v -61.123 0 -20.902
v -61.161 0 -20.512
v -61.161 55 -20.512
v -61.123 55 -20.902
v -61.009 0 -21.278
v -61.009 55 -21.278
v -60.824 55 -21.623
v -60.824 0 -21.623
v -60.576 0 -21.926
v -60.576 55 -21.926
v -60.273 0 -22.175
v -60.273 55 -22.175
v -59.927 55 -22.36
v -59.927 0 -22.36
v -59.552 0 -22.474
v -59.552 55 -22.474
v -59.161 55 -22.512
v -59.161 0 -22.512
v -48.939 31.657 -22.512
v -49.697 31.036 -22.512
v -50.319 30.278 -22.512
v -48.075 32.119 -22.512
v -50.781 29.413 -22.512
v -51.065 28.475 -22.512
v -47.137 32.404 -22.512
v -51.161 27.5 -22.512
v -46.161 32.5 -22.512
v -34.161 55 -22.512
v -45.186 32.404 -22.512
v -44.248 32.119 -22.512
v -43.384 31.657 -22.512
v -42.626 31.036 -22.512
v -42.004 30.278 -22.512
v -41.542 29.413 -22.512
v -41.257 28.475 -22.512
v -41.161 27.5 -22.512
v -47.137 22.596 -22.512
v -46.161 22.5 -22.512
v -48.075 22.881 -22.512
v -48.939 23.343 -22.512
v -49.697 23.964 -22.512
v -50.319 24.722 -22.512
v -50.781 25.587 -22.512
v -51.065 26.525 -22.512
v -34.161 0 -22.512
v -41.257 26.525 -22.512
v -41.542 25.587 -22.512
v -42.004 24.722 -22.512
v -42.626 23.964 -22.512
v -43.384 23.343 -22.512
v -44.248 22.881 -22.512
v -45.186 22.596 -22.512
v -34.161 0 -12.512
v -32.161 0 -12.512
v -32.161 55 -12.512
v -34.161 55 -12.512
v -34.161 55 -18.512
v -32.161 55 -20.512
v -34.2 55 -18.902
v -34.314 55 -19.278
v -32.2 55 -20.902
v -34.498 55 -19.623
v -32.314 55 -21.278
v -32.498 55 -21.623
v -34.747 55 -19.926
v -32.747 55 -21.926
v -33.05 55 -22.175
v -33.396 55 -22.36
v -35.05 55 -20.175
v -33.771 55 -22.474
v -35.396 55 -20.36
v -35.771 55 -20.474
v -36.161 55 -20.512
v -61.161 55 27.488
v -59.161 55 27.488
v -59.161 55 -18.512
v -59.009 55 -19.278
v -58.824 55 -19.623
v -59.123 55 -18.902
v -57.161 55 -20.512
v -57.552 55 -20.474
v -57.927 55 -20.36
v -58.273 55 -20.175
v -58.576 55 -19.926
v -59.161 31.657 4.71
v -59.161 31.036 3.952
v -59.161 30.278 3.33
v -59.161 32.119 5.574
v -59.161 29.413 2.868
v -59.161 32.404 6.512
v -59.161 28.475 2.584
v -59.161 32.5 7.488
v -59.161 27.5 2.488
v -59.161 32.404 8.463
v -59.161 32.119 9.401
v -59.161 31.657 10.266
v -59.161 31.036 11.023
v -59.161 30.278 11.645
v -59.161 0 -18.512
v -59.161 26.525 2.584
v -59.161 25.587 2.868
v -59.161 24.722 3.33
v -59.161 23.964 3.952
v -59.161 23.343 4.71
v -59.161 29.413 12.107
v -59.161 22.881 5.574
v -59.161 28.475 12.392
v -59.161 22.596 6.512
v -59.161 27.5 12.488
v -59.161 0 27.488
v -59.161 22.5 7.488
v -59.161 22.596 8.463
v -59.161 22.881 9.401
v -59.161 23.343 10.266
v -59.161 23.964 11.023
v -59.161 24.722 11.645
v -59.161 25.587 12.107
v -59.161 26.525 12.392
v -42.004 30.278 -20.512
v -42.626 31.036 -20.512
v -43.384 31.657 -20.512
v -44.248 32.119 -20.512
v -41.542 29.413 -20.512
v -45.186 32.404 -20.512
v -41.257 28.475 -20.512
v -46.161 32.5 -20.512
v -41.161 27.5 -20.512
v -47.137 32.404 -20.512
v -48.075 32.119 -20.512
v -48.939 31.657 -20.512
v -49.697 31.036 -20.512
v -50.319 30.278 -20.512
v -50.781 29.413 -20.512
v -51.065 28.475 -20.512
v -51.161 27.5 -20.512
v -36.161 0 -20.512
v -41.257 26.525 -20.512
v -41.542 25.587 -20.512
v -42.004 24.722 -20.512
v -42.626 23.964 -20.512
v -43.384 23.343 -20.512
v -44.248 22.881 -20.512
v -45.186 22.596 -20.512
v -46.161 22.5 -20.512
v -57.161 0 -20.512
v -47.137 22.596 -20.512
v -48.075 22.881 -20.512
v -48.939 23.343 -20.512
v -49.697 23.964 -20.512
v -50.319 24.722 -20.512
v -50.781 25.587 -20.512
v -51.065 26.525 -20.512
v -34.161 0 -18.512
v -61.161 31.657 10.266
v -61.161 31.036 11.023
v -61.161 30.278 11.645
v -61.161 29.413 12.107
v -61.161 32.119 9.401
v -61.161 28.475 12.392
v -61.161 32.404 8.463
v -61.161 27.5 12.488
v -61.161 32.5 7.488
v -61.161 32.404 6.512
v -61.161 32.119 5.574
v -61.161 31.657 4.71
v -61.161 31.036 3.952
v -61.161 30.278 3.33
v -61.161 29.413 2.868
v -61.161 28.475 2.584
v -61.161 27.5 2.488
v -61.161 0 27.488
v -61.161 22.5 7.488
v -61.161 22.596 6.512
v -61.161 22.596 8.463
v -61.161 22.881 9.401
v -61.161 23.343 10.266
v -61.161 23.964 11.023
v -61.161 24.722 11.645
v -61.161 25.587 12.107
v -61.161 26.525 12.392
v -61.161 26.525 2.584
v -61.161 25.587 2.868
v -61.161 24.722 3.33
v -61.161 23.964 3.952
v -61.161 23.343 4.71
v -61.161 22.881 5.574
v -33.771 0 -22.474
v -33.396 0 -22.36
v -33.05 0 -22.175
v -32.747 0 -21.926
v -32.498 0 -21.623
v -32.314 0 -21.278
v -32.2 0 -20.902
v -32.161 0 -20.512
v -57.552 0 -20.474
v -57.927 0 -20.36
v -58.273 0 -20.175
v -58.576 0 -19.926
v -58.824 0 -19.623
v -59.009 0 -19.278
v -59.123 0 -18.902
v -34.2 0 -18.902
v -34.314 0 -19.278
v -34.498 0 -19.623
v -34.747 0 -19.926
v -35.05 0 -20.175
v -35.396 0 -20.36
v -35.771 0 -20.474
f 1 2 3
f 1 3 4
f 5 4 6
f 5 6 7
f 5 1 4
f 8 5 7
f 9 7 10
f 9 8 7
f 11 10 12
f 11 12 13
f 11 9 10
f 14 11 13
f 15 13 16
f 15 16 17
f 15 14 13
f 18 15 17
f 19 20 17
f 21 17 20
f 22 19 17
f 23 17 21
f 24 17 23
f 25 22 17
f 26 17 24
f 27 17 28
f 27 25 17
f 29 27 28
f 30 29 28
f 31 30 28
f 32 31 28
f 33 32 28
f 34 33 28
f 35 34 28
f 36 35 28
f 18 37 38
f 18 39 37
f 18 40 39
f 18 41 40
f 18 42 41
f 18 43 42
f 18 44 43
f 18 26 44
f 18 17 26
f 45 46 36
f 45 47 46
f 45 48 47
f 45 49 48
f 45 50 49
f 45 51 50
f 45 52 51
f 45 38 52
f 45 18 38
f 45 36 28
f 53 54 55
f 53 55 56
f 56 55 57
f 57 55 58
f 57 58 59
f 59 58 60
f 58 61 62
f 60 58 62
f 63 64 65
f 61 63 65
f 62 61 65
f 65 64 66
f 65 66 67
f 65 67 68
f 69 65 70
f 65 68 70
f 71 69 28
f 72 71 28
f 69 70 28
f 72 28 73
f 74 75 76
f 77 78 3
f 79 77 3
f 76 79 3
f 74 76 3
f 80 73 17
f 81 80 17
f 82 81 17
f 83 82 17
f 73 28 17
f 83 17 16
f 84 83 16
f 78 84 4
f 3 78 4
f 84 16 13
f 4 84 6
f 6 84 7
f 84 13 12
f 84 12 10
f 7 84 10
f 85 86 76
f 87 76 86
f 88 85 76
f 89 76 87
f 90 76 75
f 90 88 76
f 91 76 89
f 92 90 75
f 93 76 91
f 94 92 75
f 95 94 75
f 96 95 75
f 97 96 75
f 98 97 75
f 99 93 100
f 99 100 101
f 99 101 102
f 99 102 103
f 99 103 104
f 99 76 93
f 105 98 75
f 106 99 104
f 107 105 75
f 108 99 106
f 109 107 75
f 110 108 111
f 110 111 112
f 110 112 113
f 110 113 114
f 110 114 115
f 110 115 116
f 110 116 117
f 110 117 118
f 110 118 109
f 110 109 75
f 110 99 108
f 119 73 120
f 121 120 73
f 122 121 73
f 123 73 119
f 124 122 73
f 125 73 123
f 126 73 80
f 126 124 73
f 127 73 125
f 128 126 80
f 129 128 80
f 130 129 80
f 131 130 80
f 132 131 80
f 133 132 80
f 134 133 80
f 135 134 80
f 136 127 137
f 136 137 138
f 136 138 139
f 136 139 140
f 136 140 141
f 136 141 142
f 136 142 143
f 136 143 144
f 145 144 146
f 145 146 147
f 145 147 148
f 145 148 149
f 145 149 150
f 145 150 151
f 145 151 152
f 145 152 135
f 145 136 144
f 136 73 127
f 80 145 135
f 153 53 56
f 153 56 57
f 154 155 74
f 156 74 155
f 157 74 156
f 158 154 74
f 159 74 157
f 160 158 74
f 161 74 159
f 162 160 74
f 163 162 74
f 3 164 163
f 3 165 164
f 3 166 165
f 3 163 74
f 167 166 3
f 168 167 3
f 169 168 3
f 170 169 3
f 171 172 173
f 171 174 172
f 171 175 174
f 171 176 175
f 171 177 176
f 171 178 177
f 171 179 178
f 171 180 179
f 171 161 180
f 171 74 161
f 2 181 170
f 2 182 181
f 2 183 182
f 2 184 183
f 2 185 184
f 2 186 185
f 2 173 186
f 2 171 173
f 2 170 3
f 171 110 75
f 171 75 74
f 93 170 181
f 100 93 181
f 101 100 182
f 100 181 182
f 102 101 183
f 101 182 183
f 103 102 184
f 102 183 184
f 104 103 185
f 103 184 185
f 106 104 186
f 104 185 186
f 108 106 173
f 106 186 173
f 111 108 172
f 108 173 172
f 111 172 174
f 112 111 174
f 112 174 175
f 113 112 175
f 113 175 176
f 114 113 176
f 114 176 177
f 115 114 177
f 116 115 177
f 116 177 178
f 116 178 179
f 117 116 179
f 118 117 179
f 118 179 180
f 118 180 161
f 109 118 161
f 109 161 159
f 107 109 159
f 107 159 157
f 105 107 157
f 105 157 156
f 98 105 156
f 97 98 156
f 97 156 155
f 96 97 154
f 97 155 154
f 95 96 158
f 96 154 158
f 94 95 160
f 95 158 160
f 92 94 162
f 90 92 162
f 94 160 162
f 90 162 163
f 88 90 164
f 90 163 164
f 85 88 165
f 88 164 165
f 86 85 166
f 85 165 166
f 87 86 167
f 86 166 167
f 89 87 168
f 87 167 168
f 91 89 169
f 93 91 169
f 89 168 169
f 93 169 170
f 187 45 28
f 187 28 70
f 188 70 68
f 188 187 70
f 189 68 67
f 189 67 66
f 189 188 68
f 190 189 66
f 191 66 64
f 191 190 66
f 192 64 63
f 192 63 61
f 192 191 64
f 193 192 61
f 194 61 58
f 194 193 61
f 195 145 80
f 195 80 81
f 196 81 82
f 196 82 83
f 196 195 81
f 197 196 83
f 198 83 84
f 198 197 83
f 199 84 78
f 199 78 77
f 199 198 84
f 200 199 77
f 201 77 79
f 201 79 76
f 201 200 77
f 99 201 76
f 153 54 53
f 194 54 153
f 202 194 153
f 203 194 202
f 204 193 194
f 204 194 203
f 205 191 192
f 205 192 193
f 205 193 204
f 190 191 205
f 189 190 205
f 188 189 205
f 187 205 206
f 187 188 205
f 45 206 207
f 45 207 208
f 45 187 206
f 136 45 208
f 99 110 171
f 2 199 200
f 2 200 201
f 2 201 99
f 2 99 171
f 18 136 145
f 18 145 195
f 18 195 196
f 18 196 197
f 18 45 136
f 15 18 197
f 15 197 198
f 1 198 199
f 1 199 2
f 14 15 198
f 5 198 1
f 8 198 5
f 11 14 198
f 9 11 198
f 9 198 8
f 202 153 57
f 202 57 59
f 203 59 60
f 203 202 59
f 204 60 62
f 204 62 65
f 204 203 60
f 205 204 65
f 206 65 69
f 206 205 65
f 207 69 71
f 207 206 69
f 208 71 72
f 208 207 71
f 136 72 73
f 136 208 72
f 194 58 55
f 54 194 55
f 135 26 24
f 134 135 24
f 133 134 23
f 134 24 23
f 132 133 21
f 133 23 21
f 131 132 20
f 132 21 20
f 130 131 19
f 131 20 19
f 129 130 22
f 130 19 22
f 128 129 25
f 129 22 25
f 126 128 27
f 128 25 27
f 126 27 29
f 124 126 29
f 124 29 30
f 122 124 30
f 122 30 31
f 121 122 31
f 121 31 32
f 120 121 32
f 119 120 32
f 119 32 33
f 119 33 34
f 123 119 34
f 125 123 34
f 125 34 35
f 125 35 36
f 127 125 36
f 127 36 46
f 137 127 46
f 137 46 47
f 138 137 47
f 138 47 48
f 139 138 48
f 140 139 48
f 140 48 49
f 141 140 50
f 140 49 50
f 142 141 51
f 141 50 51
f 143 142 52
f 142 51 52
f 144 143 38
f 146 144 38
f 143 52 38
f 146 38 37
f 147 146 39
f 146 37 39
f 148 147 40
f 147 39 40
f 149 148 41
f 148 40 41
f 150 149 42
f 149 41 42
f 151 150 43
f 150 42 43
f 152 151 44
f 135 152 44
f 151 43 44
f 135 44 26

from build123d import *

# Parameters (mm, degrees)
BOSS_EXTRUDE1_DEPTH              = 55
M10X1_0_TAPPED_HOLE2_D           = 9
M10X1_0_TAPPED_HOLE2_DEPTH       = 23
M10X1_0_TAPPED_HOLE2_CBORE_D     = 10
M10X1_0_TAPPED_HOLE2_CBORE_DEPTH = 20
M10X1_0_TAPPED_HOLE2_TIP         = 2.703872786
M10X1_0_TAPPED_HOLE1_D           = 9
M10X1_0_TAPPED_HOLE1_DEPTH       = 23
M10X1_0_TAPPED_HOLE1_CBORE_D     = 10
M10X1_0_TAPPED_HOLE1_CBORE_DEPTH = 20
M10X1_0_TAPPED_HOLE1_TIP         = 2.703872786


with BuildPart() as part:
    # Sketch1 → Boss-Extrude1 (new body)
    with BuildSketch(Plane(origin=(0, 0, 0), x_dir=(1, 0, 0), z_dir=(0, 1, 0))):
        with BuildLine():
            Line((-61.161397451, -27.487824391), (-61.161397451, 20.512175609))
            ThreePointArc((-61.161397451, 20.512175609), (-60.575611013, 21.926389171), (-59.161397451, 22.512175609))
            Line((-59.161397451, 22.512175609), (-34.161397451, 22.512175609))
            ThreePointArc((-34.161397451, 22.512175609), (-32.747183888, 21.926389171), (-32.161397451, 20.512175609))
            Line((-32.161397451, 20.512175609), (-32.161397451, 12.512175609))
            Line((-32.161397451, 12.512175609), (-34.161397451, 12.512175609))
            Line((-34.161397451, 12.512175609), (-34.161397451, 18.512175609))
            ThreePointArc((-34.161397451, 18.512175609), (-34.747183888, 19.926389171), (-36.161397451, 20.512175609))
            Line((-36.161397451, 20.512175609), (-57.161397451, 20.512175609))
            ThreePointArc((-57.161397451, 20.512175609), (-58.575611013, 19.926389171), (-59.161397451, 18.512175609))
            Line((-59.161397451, 18.512175609), (-59.161397451, -27.487824391))
            Line((-59.161397451, -27.487824391), (-61.161397451, -27.487824391))
        make_face()
    extrude(amount=BOSS_EXTRUDE1_DEPTH)

    # M10x1.0 Tapped Hole2
    with Locations(Plane(origin=(-46.161397451, 27.5, -22.512175609), x_dir=(-1, 0, 0), z_dir=(0, 0, -1))):
        with Locations((0, 0)):
            CounterBoreHole(M10X1_0_TAPPED_HOLE2_D / 2, M10X1_0_TAPPED_HOLE2_CBORE_D / 2, M10X1_0_TAPPED_HOLE2_CBORE_DEPTH, depth=M10X1_0_TAPPED_HOLE2_DEPTH)
            with Locations((0, 0, -(M10X1_0_TAPPED_HOLE2_DEPTH + M10X1_0_TAPPED_HOLE2_TIP / 2))):  # 118° drill point
                Cone(0, M10X1_0_TAPPED_HOLE2_D / 2, M10X1_0_TAPPED_HOLE2_TIP, mode=Mode.SUBTRACT)

    # M10x1.0 Tapped Hole1
    with Locations(Plane(origin=(-61.161397451, 27.5, 7.487824391), x_dir=(0, 0, -1), z_dir=(-1, 0, 0))):
        with Locations((0, 0)):
            CounterBoreHole(M10X1_0_TAPPED_HOLE1_D / 2, M10X1_0_TAPPED_HOLE1_CBORE_D / 2, M10X1_0_TAPPED_HOLE1_CBORE_DEPTH, depth=M10X1_0_TAPPED_HOLE1_DEPTH)
            with Locations((0, 0, -(M10X1_0_TAPPED_HOLE1_DEPTH + M10X1_0_TAPPED_HOLE1_TIP / 2))):  # 118° drill point
                Cone(0, M10X1_0_TAPPED_HOLE1_D / 2, M10X1_0_TAPPED_HOLE1_TIP, mode=Mode.SUBTRACT)


solid = part.part
